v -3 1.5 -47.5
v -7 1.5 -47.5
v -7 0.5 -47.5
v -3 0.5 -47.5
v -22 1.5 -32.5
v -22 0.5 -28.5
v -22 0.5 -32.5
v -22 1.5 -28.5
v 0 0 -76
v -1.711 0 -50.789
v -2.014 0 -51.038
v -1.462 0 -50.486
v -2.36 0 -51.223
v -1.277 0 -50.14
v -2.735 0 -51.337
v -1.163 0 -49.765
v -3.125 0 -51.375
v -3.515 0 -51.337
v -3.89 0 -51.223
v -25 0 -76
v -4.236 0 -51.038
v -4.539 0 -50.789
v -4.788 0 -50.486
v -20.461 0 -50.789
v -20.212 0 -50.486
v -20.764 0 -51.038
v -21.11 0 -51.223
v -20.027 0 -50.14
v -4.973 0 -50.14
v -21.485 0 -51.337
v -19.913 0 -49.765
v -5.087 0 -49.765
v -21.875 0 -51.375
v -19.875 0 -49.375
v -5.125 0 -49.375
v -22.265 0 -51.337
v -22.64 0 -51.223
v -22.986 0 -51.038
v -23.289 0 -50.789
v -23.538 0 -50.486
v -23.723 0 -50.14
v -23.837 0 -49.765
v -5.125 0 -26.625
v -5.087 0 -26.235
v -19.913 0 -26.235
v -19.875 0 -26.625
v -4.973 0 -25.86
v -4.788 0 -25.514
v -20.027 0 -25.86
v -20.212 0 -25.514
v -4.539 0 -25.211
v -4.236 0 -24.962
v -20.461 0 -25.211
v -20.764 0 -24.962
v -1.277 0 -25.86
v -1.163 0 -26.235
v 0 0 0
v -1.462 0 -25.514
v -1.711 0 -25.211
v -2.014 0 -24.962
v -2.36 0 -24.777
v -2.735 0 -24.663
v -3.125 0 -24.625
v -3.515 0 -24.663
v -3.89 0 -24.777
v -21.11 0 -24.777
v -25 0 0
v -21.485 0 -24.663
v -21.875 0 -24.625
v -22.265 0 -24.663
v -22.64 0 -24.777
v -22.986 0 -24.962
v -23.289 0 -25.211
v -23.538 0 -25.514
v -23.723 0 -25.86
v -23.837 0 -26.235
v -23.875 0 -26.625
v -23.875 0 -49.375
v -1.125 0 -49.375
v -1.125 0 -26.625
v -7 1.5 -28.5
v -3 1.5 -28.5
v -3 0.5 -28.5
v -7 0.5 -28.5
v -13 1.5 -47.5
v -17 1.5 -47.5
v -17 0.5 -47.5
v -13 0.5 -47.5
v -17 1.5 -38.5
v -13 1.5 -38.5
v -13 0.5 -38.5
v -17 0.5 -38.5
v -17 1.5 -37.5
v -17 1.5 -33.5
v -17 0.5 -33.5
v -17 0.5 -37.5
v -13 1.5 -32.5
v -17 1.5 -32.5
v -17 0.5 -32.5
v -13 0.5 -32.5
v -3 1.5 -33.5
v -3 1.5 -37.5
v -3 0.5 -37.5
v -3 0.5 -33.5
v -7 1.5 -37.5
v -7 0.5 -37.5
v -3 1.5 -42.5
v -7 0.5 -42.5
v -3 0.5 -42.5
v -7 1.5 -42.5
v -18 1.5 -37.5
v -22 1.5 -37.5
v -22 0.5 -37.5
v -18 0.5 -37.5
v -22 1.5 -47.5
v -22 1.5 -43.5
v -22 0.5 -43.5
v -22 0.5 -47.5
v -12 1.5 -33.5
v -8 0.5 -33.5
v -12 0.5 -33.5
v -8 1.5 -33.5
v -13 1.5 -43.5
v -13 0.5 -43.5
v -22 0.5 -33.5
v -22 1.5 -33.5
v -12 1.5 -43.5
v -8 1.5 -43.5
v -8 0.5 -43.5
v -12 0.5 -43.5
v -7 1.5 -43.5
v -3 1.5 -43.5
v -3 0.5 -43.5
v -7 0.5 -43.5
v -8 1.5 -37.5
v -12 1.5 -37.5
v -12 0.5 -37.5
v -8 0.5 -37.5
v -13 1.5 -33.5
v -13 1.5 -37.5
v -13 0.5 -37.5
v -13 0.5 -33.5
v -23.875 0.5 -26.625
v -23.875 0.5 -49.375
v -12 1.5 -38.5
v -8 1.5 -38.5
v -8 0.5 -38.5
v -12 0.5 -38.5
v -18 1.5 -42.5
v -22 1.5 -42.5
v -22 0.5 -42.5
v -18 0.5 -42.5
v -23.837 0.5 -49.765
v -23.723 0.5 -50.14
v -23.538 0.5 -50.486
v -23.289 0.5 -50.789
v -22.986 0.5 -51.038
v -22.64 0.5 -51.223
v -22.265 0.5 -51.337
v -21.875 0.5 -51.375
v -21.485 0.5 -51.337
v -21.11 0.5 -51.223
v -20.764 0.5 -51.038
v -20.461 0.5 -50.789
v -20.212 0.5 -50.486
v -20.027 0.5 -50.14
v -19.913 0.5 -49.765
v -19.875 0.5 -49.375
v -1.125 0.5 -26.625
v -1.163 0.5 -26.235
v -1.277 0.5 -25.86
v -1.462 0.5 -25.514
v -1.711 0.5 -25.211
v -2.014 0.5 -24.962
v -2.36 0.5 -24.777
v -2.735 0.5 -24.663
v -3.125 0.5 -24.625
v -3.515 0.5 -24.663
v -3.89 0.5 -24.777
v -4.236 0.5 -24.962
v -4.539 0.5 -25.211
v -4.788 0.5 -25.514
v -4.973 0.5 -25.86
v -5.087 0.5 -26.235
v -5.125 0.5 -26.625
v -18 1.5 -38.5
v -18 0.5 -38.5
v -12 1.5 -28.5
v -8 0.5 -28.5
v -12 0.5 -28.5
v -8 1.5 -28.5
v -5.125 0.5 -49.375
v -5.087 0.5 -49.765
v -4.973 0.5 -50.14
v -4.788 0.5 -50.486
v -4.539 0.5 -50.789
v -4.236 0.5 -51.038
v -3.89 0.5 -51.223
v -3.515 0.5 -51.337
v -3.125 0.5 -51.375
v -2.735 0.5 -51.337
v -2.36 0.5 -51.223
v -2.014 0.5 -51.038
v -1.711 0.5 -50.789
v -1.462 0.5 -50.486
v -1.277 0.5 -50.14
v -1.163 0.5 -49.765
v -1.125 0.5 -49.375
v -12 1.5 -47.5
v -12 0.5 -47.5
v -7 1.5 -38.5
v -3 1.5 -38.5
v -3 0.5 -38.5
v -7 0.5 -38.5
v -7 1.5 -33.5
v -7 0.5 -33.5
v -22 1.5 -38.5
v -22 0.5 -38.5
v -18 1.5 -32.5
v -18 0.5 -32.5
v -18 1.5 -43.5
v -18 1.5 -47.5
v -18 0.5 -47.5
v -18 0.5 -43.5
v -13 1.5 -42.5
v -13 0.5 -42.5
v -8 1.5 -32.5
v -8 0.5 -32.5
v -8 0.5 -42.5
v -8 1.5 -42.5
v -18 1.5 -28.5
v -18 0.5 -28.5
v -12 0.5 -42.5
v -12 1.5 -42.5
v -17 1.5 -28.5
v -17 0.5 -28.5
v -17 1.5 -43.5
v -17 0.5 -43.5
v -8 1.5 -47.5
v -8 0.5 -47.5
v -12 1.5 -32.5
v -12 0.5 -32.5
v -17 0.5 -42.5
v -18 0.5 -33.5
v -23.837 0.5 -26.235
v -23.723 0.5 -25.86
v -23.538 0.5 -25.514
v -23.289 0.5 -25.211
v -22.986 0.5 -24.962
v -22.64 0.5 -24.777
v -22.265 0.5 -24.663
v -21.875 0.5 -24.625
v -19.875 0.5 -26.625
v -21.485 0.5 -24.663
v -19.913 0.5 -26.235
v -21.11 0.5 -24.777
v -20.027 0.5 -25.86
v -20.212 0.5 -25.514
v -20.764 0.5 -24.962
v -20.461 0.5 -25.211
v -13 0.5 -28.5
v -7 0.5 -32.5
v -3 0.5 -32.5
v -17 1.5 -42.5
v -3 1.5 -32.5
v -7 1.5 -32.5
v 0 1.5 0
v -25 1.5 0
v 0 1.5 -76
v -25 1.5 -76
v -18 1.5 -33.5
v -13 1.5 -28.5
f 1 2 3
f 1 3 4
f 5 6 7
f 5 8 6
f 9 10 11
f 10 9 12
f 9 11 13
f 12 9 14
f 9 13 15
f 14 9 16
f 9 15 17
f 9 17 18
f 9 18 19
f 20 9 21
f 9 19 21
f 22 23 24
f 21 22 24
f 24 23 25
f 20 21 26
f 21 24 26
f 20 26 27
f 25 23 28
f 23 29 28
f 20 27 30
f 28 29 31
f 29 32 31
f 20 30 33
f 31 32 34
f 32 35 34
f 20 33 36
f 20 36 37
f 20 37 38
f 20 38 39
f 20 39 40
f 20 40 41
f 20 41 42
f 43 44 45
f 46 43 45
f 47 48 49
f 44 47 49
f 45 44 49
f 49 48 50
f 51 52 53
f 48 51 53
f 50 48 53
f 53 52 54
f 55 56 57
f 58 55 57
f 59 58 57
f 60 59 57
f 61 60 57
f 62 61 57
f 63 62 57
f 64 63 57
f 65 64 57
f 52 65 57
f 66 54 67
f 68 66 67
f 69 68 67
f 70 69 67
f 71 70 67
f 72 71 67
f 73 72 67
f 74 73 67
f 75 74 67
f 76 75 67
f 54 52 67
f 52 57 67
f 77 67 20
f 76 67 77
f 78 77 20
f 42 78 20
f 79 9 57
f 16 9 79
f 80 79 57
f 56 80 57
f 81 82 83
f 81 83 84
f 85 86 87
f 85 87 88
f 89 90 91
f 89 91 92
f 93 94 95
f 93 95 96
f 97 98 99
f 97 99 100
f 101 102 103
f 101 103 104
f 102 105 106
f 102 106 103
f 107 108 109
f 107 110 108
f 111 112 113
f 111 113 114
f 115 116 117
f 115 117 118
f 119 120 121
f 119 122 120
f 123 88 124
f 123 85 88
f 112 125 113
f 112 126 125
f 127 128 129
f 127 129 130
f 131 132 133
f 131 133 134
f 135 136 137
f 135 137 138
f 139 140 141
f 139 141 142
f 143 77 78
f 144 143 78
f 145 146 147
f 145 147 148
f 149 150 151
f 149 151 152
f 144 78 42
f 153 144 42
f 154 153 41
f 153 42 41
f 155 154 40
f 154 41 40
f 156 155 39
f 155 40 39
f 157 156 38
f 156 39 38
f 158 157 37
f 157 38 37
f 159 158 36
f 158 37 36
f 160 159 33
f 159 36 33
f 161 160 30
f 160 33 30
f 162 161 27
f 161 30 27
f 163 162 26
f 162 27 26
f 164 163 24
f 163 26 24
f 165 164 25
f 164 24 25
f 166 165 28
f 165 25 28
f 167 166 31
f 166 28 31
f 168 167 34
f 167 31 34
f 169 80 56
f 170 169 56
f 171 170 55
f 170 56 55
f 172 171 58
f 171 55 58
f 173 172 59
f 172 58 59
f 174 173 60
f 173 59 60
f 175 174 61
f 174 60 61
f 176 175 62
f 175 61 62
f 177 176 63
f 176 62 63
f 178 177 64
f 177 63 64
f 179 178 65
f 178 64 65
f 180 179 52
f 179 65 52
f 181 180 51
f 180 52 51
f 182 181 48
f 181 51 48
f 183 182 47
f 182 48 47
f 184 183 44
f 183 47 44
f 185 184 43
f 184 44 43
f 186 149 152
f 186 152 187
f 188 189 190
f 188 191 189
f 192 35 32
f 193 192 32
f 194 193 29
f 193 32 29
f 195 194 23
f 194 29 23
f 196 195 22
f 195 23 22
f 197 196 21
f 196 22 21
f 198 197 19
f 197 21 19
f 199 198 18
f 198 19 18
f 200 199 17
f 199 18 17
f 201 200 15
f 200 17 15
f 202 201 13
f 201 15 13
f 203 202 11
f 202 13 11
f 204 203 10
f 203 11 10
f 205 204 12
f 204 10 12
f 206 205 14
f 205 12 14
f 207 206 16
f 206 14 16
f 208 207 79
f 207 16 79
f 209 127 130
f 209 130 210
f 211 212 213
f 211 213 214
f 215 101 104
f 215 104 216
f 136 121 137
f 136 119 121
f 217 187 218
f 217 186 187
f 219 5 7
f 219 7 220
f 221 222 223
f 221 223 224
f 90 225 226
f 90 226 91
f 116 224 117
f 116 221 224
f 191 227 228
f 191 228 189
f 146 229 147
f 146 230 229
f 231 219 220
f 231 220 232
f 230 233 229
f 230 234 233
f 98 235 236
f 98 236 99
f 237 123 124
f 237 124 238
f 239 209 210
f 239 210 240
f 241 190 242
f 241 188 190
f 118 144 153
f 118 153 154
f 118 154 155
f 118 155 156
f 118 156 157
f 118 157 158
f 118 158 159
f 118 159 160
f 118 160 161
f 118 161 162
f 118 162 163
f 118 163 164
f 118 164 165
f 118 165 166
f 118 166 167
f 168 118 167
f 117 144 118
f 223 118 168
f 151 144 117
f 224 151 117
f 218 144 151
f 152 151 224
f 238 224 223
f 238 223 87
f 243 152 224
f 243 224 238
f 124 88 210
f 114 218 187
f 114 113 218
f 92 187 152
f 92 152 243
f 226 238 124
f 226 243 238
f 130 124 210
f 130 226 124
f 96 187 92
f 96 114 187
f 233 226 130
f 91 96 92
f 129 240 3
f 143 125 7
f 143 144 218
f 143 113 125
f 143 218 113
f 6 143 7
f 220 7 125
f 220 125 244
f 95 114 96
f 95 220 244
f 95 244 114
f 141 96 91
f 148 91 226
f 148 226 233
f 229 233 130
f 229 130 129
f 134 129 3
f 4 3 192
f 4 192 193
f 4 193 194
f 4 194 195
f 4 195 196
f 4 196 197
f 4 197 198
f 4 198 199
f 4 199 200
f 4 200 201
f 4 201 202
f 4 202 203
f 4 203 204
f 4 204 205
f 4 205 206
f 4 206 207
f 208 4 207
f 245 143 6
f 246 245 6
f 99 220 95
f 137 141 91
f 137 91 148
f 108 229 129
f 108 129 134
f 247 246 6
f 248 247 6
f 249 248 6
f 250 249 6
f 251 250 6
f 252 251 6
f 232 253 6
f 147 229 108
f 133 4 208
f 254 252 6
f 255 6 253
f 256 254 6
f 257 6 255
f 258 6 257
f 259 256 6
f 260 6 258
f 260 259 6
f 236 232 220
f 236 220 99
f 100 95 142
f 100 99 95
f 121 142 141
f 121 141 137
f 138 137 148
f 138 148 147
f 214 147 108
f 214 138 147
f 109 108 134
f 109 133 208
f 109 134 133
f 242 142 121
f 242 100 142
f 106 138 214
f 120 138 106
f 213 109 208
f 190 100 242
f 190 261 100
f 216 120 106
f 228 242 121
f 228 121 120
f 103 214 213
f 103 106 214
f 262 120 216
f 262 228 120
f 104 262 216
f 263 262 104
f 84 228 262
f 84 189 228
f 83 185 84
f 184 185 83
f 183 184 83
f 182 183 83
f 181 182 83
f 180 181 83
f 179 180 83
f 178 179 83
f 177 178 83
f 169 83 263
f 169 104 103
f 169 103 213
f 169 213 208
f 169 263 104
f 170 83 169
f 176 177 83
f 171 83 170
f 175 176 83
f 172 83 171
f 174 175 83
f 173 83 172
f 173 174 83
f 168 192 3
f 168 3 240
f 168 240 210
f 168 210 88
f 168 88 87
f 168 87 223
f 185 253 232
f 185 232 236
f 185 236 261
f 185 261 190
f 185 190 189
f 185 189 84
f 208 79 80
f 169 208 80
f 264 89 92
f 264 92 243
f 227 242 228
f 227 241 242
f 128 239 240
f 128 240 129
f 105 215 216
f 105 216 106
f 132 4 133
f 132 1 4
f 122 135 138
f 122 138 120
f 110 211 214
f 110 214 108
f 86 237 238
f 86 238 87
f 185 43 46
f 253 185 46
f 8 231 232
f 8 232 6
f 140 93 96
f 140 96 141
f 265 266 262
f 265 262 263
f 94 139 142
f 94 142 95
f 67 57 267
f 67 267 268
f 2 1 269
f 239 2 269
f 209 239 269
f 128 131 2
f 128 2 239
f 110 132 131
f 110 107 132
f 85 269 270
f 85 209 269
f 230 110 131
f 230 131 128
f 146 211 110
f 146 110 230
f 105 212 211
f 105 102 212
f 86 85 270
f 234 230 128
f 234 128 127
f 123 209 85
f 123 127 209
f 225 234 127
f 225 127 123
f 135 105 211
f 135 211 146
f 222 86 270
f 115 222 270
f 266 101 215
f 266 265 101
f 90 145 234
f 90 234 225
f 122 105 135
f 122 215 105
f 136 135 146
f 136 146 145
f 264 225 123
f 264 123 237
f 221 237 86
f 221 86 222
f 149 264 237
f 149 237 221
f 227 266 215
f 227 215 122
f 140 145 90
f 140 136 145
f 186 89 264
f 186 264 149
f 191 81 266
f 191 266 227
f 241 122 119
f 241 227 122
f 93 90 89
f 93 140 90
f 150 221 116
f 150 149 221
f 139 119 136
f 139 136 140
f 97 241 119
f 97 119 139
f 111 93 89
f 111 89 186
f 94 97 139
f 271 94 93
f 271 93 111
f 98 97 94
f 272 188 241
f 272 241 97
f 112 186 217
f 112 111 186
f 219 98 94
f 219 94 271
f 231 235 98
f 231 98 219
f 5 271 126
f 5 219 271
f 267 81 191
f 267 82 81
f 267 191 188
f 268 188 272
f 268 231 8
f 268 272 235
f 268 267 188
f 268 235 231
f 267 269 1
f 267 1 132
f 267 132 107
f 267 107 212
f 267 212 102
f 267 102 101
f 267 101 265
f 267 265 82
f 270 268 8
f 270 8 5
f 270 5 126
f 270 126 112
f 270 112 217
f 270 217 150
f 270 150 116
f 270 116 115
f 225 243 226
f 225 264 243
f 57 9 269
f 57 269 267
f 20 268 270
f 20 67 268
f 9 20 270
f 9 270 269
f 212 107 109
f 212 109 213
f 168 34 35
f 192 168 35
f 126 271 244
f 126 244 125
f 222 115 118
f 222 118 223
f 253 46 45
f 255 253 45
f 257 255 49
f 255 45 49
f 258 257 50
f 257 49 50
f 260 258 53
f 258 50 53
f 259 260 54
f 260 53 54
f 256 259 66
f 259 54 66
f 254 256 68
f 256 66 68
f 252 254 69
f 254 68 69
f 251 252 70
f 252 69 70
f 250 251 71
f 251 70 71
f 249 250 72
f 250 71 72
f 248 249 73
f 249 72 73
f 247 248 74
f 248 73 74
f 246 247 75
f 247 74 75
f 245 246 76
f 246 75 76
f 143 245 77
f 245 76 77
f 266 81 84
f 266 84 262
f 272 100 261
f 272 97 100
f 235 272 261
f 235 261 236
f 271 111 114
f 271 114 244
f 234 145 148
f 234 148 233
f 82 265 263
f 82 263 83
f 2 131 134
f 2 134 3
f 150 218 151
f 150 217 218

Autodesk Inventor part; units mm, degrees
ref_plane "YZ Plane" through (0, 0, 0) normal (1, 0, 0) x (0, 1, 0)
ref_plane "XZ Plane" through (0, 0, 0) normal (0, 1, 0) x (-1, 0, 0)
ref_plane "XY Plane" through (0, 0, 0) normal (0, 0, 1) x (1, 0, 0)
sketch "Sketch1" plane through (0, 0, 0) normal (0, 1, 0) x (-1, 0, 0)
  line L0 (0, 0) -> (25, 0)
  line L1 (25, 0) -> (25, -76)
  line L2 (25, -76) -> (0, -76)
  line L3 (0, -76) -> (0, 0)
  dimension "d0" = 76
  dimension "d1" = 25
extrude "Extrusion1" add sketch "Sketch1" along normal blind 1.5
ref_plane "Work Plane2" through (0, 5.5, 0) normal (0, 1, 0) x (1, 0, 0)
sketch "Sketch3" plane through (0, 5.5, 0) normal (0, 1, 0) x (1, 0, 0)
  line L0 (0, 0) -> (-25, 0) construction
  line L1 (-12.5, 0) -> (-12.5, 76) construction
  line L2 (-25, 76) -> (0, 76) construction
  line L3 (-25, 71) -> (-25, 5) construction
  line L4 (-25, 38) -> (-0.4405, 38) construction
  line L5 (-20, 28.5) -> (-5, 28.5) construction
  line L6 (-3, 30.5) -> (-3, 45.5) construction
  line L7 (-5, 47.5) -> (-20, 47.5) construction
  line L8 (-22, 45.5) -> (-22, 30.5) construction
  line L9 (-22, 28.5) -> (-3, 47.5) construction
  line L10 (-3, 28.5) -> (-22, 47.5) construction
  arc A0 (-20, 47.5) -> (-22, 45.5) centre (-20, 45.5) ccw construction
  arc A1 (-3, 45.5) -> (-5, 47.5) centre (-5, 45.5) ccw construction
  arc A2 (-5, 28.5) -> (-3, 30.5) centre (-5, 30.5) ccw construction
  arc A3 (-22, 30.5) -> (-20, 28.5) centre (-20, 30.5) ccw construction
  line L11 (-22, 47.5) -> (-18, 47.5)
  line L12 (-18, 47.5) -> (-18, 43.5)
  line L13 (-18, 43.5) -> (-22, 43.5)
  line L14 (-22, 43.5) -> (-22, 47.5)
  line L15 (0, 47.5) -> (-15, 47.5) construction
  line L16 (-13, 43.5) -> (-17, 43.5)
  line L17 (-13, 47.5) -> (-13, 43.5)
  line L18 (-17, 47.5) -> (-13, 47.5)
  line L19 (-17, 43.5) -> (-17, 47.5)
  line L20 (5, 47.5) -> (-10, 47.5) construction
  line L21 (-8, 43.5) -> (-12, 43.5)
  line L22 (-8, 47.5) -> (-8, 43.5)
  line L23 (-12, 47.5) -> (-8, 47.5)
  line L24 (-12, 43.5) -> (-12, 47.5)
  line L25 (10, 47.5) -> (-5, 47.5) construction
  line L26 (-3, 43.5) -> (-7, 43.5)
  line L27 (-3, 47.5) -> (-3, 43.5)
  line L28 (-7, 47.5) -> (-3, 47.5)
  line L29 (-7, 43.5) -> (-7, 47.5)
  line L30 (-5, 42.5) -> (-20, 42.5) construction
  line L31 (-18, 38.5) -> (-22, 38.5)
  line L32 (-18, 42.5) -> (-18, 38.5)
  line L33 (-22, 42.5) -> (-18, 42.5)
  line L34 (-22, 38.5) -> (-22, 42.5)
  line L35 (0, 42.5) -> (-15, 42.5) construction
  line L36 (-13, 38.5) -> (-17, 38.5)
  line L37 (-13, 42.5) -> (-13, 38.5)
  line L38 (-17, 42.5) -> (-13, 42.5)
  line L39 (-17, 38.5) -> (-17, 42.5)
  line L40 (5, 42.5) -> (-10, 42.5) construction
  line L41 (-8, 38.5) -> (-12, 38.5)
  line L42 (-8, 42.5) -> (-8, 38.5)
  line L43 (-12, 42.5) -> (-8, 42.5)
  line L44 (-12, 38.5) -> (-12, 42.5)
  line L45 (10, 42.5) -> (-5, 42.5) construction
  line L46 (-3, 38.5) -> (-7, 38.5)
  line L47 (-3, 42.5) -> (-3, 38.5)
  line L48 (-7, 42.5) -> (-3, 42.5)
  line L49 (-7, 38.5) -> (-7, 42.5)
  line L50 (-5, 37.5) -> (-20, 37.5) construction
  line L51 (-18, 33.5) -> (-22, 33.5)
  line L52 (-18, 37.5) -> (-18, 33.5)
  line L53 (-22, 37.5) -> (-18, 37.5)
  line L54 (-22, 33.5) -> (-22, 37.5)
  line L55 (0, 37.5) -> (-15, 37.5) construction
  line L56 (-13, 33.5) -> (-17, 33.5)
  line L57 (-13, 37.5) -> (-13, 33.5)
  line L58 (-17, 37.5) -> (-13, 37.5)
  line L59 (-17, 33.5) -> (-17, 37.5)
  line L60 (5, 37.5) -> (-10, 37.5) construction
  line L61 (-8, 33.5) -> (-12, 33.5)
  line L62 (-8, 37.5) -> (-8, 33.5)
  line L63 (-12, 37.5) -> (-8, 37.5)
  line L64 (-12, 33.5) -> (-12, 37.5)
  line L65 (10, 37.5) -> (-5, 37.5) construction
  line L66 (-3, 33.5) -> (-7, 33.5)
  line L67 (-3, 37.5) -> (-3, 33.5)
  line L68 (-7, 37.5) -> (-3, 37.5)
  line L69 (-7, 33.5) -> (-7, 37.5)
  line L70 (-5, 32.5) -> (-20, 32.5) construction
  line L71 (-18, 28.5) -> (-22, 28.5)
  line L72 (-18, 32.5) -> (-18, 28.5)
  line L73 (-22, 32.5) -> (-18, 32.5)
  line L74 (-22, 28.5) -> (-22, 32.5)
  line L75 (0, 32.5) -> (-15, 32.5) construction
  line L76 (-13, 28.5) -> (-17, 28.5)
  line L77 (-13, 32.5) -> (-13, 28.5)
  line L78 (-17, 32.5) -> (-13, 32.5)
  line L79 (-17, 28.5) -> (-17, 32.5)
  line L80 (5, 32.5) -> (-10, 32.5) construction
  line L81 (-8, 28.5) -> (-12, 28.5)
  line L82 (-8, 32.5) -> (-8, 28.5)
  line L83 (-12, 32.5) -> (-8, 32.5)
  line L84 (-12, 28.5) -> (-12, 32.5)
  line L85 (10, 32.5) -> (-5, 32.5) construction
  line L86 (-3, 28.5) -> (-7, 28.5)
  line L87 (-3, 32.5) -> (-3, 28.5)
  line L88 (-7, 32.5) -> (-3, 32.5)
  line L89 (-7, 28.5) -> (-7, 32.5)
  point P0 (-12.5, 38)
  point P1 (2, 47.5)
  point P2 (7, 47.5)
  point P3 (12, 47.5)
  point P4 (-3, 42.5)
  point P5 (2, 42.5)
  point P6 (7, 42.5)
  point P7 (12, 42.5)
  point P8 (-3, 37.5)
  point P9 (2, 37.5)
  point P10 (7, 37.5)
  point P11 (12, 37.5)
  point P12 (-3, 32.5)
  point P13 (2, 32.5)
  point P14 (7, 32.5)
  point P15 (12, 32.5)
  dimension "d8" = 19
  dimension "d9" = 2
  dimension "d10" = 2
  dimension "d11" = 2
  dimension "d12" = 2
  dimension "d20" = 4
  dimension "d23" = 5
  dimension "d26" = 5
extrude "Extrusion3" cut sketch "Sketch3" against normal blind 6
sketch "Sketch4" plane through (0, 0, 0) normal (0, -1, 0) x (1, 0, 0)
  line L0 (0, -76) -> (0, 0) construction
  line L1 (0, -38) -> (-25, -38) construction
  line L2 (-25, -71) -> (-25, -5) construction
  line L3 (0, 0) -> (-25, 0) construction
  line L4 (-12.5, 0) -> (-12.5, -76) construction
  line L5 (-25, -76) -> (0, -76) construction
  line L6 (-19.875, -49.375) -> (-5.125, -49.375)
  line L7 (-1.125, -49.375) -> (-1.125, -26.625)
  line L8 (-5.125, -26.625) -> (-19.875, -26.625)
  line L9 (-23.875, -26.625) -> (-23.875, -49.375)
  line L10 (-23.875, -49.375) -> (-1.125, -26.625) construction
  line L11 (-1.125, -49.375) -> (-23.875, -26.625) construction
  arc A0 (-1.125, -26.625) -> (-5.125, -26.625) centre (-3.125, -26.625) ccw
  arc A1 (-19.875, -26.625) -> (-23.875, -26.625) centre (-21.875, -26.625) ccw
  arc A2 (-23.875, -49.375) -> (-19.875, -49.375) centre (-21.875, -49.375) ccw
  arc A3 (-5.125, -49.375) -> (-1.125, -49.375) centre (-3.125, -49.375) ccw
  point P0 (-12.5, -38)
  dimension "d15" = 22.75
  dimension "d16" = 4
  dimension "d17" = 22.75
extrude "Extrusion4" cut sketch "Sketch4" against normal blind 0.5
properties part number "scope coverslip holder lowpro offset"
